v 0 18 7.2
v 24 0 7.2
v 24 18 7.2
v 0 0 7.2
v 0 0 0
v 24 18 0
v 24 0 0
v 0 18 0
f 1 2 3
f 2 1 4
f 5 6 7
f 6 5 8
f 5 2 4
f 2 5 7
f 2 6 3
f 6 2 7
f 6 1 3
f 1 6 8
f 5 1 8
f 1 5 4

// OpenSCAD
/**
 * batteryCustom
 * @name batteryCustom
 * @description batteryCustom
 * @type component
 * @parent root
 */
module batteryCustom() {
    color("red")
    cube([24, 18, 7.2], center = false);
}


batteryCustom();
